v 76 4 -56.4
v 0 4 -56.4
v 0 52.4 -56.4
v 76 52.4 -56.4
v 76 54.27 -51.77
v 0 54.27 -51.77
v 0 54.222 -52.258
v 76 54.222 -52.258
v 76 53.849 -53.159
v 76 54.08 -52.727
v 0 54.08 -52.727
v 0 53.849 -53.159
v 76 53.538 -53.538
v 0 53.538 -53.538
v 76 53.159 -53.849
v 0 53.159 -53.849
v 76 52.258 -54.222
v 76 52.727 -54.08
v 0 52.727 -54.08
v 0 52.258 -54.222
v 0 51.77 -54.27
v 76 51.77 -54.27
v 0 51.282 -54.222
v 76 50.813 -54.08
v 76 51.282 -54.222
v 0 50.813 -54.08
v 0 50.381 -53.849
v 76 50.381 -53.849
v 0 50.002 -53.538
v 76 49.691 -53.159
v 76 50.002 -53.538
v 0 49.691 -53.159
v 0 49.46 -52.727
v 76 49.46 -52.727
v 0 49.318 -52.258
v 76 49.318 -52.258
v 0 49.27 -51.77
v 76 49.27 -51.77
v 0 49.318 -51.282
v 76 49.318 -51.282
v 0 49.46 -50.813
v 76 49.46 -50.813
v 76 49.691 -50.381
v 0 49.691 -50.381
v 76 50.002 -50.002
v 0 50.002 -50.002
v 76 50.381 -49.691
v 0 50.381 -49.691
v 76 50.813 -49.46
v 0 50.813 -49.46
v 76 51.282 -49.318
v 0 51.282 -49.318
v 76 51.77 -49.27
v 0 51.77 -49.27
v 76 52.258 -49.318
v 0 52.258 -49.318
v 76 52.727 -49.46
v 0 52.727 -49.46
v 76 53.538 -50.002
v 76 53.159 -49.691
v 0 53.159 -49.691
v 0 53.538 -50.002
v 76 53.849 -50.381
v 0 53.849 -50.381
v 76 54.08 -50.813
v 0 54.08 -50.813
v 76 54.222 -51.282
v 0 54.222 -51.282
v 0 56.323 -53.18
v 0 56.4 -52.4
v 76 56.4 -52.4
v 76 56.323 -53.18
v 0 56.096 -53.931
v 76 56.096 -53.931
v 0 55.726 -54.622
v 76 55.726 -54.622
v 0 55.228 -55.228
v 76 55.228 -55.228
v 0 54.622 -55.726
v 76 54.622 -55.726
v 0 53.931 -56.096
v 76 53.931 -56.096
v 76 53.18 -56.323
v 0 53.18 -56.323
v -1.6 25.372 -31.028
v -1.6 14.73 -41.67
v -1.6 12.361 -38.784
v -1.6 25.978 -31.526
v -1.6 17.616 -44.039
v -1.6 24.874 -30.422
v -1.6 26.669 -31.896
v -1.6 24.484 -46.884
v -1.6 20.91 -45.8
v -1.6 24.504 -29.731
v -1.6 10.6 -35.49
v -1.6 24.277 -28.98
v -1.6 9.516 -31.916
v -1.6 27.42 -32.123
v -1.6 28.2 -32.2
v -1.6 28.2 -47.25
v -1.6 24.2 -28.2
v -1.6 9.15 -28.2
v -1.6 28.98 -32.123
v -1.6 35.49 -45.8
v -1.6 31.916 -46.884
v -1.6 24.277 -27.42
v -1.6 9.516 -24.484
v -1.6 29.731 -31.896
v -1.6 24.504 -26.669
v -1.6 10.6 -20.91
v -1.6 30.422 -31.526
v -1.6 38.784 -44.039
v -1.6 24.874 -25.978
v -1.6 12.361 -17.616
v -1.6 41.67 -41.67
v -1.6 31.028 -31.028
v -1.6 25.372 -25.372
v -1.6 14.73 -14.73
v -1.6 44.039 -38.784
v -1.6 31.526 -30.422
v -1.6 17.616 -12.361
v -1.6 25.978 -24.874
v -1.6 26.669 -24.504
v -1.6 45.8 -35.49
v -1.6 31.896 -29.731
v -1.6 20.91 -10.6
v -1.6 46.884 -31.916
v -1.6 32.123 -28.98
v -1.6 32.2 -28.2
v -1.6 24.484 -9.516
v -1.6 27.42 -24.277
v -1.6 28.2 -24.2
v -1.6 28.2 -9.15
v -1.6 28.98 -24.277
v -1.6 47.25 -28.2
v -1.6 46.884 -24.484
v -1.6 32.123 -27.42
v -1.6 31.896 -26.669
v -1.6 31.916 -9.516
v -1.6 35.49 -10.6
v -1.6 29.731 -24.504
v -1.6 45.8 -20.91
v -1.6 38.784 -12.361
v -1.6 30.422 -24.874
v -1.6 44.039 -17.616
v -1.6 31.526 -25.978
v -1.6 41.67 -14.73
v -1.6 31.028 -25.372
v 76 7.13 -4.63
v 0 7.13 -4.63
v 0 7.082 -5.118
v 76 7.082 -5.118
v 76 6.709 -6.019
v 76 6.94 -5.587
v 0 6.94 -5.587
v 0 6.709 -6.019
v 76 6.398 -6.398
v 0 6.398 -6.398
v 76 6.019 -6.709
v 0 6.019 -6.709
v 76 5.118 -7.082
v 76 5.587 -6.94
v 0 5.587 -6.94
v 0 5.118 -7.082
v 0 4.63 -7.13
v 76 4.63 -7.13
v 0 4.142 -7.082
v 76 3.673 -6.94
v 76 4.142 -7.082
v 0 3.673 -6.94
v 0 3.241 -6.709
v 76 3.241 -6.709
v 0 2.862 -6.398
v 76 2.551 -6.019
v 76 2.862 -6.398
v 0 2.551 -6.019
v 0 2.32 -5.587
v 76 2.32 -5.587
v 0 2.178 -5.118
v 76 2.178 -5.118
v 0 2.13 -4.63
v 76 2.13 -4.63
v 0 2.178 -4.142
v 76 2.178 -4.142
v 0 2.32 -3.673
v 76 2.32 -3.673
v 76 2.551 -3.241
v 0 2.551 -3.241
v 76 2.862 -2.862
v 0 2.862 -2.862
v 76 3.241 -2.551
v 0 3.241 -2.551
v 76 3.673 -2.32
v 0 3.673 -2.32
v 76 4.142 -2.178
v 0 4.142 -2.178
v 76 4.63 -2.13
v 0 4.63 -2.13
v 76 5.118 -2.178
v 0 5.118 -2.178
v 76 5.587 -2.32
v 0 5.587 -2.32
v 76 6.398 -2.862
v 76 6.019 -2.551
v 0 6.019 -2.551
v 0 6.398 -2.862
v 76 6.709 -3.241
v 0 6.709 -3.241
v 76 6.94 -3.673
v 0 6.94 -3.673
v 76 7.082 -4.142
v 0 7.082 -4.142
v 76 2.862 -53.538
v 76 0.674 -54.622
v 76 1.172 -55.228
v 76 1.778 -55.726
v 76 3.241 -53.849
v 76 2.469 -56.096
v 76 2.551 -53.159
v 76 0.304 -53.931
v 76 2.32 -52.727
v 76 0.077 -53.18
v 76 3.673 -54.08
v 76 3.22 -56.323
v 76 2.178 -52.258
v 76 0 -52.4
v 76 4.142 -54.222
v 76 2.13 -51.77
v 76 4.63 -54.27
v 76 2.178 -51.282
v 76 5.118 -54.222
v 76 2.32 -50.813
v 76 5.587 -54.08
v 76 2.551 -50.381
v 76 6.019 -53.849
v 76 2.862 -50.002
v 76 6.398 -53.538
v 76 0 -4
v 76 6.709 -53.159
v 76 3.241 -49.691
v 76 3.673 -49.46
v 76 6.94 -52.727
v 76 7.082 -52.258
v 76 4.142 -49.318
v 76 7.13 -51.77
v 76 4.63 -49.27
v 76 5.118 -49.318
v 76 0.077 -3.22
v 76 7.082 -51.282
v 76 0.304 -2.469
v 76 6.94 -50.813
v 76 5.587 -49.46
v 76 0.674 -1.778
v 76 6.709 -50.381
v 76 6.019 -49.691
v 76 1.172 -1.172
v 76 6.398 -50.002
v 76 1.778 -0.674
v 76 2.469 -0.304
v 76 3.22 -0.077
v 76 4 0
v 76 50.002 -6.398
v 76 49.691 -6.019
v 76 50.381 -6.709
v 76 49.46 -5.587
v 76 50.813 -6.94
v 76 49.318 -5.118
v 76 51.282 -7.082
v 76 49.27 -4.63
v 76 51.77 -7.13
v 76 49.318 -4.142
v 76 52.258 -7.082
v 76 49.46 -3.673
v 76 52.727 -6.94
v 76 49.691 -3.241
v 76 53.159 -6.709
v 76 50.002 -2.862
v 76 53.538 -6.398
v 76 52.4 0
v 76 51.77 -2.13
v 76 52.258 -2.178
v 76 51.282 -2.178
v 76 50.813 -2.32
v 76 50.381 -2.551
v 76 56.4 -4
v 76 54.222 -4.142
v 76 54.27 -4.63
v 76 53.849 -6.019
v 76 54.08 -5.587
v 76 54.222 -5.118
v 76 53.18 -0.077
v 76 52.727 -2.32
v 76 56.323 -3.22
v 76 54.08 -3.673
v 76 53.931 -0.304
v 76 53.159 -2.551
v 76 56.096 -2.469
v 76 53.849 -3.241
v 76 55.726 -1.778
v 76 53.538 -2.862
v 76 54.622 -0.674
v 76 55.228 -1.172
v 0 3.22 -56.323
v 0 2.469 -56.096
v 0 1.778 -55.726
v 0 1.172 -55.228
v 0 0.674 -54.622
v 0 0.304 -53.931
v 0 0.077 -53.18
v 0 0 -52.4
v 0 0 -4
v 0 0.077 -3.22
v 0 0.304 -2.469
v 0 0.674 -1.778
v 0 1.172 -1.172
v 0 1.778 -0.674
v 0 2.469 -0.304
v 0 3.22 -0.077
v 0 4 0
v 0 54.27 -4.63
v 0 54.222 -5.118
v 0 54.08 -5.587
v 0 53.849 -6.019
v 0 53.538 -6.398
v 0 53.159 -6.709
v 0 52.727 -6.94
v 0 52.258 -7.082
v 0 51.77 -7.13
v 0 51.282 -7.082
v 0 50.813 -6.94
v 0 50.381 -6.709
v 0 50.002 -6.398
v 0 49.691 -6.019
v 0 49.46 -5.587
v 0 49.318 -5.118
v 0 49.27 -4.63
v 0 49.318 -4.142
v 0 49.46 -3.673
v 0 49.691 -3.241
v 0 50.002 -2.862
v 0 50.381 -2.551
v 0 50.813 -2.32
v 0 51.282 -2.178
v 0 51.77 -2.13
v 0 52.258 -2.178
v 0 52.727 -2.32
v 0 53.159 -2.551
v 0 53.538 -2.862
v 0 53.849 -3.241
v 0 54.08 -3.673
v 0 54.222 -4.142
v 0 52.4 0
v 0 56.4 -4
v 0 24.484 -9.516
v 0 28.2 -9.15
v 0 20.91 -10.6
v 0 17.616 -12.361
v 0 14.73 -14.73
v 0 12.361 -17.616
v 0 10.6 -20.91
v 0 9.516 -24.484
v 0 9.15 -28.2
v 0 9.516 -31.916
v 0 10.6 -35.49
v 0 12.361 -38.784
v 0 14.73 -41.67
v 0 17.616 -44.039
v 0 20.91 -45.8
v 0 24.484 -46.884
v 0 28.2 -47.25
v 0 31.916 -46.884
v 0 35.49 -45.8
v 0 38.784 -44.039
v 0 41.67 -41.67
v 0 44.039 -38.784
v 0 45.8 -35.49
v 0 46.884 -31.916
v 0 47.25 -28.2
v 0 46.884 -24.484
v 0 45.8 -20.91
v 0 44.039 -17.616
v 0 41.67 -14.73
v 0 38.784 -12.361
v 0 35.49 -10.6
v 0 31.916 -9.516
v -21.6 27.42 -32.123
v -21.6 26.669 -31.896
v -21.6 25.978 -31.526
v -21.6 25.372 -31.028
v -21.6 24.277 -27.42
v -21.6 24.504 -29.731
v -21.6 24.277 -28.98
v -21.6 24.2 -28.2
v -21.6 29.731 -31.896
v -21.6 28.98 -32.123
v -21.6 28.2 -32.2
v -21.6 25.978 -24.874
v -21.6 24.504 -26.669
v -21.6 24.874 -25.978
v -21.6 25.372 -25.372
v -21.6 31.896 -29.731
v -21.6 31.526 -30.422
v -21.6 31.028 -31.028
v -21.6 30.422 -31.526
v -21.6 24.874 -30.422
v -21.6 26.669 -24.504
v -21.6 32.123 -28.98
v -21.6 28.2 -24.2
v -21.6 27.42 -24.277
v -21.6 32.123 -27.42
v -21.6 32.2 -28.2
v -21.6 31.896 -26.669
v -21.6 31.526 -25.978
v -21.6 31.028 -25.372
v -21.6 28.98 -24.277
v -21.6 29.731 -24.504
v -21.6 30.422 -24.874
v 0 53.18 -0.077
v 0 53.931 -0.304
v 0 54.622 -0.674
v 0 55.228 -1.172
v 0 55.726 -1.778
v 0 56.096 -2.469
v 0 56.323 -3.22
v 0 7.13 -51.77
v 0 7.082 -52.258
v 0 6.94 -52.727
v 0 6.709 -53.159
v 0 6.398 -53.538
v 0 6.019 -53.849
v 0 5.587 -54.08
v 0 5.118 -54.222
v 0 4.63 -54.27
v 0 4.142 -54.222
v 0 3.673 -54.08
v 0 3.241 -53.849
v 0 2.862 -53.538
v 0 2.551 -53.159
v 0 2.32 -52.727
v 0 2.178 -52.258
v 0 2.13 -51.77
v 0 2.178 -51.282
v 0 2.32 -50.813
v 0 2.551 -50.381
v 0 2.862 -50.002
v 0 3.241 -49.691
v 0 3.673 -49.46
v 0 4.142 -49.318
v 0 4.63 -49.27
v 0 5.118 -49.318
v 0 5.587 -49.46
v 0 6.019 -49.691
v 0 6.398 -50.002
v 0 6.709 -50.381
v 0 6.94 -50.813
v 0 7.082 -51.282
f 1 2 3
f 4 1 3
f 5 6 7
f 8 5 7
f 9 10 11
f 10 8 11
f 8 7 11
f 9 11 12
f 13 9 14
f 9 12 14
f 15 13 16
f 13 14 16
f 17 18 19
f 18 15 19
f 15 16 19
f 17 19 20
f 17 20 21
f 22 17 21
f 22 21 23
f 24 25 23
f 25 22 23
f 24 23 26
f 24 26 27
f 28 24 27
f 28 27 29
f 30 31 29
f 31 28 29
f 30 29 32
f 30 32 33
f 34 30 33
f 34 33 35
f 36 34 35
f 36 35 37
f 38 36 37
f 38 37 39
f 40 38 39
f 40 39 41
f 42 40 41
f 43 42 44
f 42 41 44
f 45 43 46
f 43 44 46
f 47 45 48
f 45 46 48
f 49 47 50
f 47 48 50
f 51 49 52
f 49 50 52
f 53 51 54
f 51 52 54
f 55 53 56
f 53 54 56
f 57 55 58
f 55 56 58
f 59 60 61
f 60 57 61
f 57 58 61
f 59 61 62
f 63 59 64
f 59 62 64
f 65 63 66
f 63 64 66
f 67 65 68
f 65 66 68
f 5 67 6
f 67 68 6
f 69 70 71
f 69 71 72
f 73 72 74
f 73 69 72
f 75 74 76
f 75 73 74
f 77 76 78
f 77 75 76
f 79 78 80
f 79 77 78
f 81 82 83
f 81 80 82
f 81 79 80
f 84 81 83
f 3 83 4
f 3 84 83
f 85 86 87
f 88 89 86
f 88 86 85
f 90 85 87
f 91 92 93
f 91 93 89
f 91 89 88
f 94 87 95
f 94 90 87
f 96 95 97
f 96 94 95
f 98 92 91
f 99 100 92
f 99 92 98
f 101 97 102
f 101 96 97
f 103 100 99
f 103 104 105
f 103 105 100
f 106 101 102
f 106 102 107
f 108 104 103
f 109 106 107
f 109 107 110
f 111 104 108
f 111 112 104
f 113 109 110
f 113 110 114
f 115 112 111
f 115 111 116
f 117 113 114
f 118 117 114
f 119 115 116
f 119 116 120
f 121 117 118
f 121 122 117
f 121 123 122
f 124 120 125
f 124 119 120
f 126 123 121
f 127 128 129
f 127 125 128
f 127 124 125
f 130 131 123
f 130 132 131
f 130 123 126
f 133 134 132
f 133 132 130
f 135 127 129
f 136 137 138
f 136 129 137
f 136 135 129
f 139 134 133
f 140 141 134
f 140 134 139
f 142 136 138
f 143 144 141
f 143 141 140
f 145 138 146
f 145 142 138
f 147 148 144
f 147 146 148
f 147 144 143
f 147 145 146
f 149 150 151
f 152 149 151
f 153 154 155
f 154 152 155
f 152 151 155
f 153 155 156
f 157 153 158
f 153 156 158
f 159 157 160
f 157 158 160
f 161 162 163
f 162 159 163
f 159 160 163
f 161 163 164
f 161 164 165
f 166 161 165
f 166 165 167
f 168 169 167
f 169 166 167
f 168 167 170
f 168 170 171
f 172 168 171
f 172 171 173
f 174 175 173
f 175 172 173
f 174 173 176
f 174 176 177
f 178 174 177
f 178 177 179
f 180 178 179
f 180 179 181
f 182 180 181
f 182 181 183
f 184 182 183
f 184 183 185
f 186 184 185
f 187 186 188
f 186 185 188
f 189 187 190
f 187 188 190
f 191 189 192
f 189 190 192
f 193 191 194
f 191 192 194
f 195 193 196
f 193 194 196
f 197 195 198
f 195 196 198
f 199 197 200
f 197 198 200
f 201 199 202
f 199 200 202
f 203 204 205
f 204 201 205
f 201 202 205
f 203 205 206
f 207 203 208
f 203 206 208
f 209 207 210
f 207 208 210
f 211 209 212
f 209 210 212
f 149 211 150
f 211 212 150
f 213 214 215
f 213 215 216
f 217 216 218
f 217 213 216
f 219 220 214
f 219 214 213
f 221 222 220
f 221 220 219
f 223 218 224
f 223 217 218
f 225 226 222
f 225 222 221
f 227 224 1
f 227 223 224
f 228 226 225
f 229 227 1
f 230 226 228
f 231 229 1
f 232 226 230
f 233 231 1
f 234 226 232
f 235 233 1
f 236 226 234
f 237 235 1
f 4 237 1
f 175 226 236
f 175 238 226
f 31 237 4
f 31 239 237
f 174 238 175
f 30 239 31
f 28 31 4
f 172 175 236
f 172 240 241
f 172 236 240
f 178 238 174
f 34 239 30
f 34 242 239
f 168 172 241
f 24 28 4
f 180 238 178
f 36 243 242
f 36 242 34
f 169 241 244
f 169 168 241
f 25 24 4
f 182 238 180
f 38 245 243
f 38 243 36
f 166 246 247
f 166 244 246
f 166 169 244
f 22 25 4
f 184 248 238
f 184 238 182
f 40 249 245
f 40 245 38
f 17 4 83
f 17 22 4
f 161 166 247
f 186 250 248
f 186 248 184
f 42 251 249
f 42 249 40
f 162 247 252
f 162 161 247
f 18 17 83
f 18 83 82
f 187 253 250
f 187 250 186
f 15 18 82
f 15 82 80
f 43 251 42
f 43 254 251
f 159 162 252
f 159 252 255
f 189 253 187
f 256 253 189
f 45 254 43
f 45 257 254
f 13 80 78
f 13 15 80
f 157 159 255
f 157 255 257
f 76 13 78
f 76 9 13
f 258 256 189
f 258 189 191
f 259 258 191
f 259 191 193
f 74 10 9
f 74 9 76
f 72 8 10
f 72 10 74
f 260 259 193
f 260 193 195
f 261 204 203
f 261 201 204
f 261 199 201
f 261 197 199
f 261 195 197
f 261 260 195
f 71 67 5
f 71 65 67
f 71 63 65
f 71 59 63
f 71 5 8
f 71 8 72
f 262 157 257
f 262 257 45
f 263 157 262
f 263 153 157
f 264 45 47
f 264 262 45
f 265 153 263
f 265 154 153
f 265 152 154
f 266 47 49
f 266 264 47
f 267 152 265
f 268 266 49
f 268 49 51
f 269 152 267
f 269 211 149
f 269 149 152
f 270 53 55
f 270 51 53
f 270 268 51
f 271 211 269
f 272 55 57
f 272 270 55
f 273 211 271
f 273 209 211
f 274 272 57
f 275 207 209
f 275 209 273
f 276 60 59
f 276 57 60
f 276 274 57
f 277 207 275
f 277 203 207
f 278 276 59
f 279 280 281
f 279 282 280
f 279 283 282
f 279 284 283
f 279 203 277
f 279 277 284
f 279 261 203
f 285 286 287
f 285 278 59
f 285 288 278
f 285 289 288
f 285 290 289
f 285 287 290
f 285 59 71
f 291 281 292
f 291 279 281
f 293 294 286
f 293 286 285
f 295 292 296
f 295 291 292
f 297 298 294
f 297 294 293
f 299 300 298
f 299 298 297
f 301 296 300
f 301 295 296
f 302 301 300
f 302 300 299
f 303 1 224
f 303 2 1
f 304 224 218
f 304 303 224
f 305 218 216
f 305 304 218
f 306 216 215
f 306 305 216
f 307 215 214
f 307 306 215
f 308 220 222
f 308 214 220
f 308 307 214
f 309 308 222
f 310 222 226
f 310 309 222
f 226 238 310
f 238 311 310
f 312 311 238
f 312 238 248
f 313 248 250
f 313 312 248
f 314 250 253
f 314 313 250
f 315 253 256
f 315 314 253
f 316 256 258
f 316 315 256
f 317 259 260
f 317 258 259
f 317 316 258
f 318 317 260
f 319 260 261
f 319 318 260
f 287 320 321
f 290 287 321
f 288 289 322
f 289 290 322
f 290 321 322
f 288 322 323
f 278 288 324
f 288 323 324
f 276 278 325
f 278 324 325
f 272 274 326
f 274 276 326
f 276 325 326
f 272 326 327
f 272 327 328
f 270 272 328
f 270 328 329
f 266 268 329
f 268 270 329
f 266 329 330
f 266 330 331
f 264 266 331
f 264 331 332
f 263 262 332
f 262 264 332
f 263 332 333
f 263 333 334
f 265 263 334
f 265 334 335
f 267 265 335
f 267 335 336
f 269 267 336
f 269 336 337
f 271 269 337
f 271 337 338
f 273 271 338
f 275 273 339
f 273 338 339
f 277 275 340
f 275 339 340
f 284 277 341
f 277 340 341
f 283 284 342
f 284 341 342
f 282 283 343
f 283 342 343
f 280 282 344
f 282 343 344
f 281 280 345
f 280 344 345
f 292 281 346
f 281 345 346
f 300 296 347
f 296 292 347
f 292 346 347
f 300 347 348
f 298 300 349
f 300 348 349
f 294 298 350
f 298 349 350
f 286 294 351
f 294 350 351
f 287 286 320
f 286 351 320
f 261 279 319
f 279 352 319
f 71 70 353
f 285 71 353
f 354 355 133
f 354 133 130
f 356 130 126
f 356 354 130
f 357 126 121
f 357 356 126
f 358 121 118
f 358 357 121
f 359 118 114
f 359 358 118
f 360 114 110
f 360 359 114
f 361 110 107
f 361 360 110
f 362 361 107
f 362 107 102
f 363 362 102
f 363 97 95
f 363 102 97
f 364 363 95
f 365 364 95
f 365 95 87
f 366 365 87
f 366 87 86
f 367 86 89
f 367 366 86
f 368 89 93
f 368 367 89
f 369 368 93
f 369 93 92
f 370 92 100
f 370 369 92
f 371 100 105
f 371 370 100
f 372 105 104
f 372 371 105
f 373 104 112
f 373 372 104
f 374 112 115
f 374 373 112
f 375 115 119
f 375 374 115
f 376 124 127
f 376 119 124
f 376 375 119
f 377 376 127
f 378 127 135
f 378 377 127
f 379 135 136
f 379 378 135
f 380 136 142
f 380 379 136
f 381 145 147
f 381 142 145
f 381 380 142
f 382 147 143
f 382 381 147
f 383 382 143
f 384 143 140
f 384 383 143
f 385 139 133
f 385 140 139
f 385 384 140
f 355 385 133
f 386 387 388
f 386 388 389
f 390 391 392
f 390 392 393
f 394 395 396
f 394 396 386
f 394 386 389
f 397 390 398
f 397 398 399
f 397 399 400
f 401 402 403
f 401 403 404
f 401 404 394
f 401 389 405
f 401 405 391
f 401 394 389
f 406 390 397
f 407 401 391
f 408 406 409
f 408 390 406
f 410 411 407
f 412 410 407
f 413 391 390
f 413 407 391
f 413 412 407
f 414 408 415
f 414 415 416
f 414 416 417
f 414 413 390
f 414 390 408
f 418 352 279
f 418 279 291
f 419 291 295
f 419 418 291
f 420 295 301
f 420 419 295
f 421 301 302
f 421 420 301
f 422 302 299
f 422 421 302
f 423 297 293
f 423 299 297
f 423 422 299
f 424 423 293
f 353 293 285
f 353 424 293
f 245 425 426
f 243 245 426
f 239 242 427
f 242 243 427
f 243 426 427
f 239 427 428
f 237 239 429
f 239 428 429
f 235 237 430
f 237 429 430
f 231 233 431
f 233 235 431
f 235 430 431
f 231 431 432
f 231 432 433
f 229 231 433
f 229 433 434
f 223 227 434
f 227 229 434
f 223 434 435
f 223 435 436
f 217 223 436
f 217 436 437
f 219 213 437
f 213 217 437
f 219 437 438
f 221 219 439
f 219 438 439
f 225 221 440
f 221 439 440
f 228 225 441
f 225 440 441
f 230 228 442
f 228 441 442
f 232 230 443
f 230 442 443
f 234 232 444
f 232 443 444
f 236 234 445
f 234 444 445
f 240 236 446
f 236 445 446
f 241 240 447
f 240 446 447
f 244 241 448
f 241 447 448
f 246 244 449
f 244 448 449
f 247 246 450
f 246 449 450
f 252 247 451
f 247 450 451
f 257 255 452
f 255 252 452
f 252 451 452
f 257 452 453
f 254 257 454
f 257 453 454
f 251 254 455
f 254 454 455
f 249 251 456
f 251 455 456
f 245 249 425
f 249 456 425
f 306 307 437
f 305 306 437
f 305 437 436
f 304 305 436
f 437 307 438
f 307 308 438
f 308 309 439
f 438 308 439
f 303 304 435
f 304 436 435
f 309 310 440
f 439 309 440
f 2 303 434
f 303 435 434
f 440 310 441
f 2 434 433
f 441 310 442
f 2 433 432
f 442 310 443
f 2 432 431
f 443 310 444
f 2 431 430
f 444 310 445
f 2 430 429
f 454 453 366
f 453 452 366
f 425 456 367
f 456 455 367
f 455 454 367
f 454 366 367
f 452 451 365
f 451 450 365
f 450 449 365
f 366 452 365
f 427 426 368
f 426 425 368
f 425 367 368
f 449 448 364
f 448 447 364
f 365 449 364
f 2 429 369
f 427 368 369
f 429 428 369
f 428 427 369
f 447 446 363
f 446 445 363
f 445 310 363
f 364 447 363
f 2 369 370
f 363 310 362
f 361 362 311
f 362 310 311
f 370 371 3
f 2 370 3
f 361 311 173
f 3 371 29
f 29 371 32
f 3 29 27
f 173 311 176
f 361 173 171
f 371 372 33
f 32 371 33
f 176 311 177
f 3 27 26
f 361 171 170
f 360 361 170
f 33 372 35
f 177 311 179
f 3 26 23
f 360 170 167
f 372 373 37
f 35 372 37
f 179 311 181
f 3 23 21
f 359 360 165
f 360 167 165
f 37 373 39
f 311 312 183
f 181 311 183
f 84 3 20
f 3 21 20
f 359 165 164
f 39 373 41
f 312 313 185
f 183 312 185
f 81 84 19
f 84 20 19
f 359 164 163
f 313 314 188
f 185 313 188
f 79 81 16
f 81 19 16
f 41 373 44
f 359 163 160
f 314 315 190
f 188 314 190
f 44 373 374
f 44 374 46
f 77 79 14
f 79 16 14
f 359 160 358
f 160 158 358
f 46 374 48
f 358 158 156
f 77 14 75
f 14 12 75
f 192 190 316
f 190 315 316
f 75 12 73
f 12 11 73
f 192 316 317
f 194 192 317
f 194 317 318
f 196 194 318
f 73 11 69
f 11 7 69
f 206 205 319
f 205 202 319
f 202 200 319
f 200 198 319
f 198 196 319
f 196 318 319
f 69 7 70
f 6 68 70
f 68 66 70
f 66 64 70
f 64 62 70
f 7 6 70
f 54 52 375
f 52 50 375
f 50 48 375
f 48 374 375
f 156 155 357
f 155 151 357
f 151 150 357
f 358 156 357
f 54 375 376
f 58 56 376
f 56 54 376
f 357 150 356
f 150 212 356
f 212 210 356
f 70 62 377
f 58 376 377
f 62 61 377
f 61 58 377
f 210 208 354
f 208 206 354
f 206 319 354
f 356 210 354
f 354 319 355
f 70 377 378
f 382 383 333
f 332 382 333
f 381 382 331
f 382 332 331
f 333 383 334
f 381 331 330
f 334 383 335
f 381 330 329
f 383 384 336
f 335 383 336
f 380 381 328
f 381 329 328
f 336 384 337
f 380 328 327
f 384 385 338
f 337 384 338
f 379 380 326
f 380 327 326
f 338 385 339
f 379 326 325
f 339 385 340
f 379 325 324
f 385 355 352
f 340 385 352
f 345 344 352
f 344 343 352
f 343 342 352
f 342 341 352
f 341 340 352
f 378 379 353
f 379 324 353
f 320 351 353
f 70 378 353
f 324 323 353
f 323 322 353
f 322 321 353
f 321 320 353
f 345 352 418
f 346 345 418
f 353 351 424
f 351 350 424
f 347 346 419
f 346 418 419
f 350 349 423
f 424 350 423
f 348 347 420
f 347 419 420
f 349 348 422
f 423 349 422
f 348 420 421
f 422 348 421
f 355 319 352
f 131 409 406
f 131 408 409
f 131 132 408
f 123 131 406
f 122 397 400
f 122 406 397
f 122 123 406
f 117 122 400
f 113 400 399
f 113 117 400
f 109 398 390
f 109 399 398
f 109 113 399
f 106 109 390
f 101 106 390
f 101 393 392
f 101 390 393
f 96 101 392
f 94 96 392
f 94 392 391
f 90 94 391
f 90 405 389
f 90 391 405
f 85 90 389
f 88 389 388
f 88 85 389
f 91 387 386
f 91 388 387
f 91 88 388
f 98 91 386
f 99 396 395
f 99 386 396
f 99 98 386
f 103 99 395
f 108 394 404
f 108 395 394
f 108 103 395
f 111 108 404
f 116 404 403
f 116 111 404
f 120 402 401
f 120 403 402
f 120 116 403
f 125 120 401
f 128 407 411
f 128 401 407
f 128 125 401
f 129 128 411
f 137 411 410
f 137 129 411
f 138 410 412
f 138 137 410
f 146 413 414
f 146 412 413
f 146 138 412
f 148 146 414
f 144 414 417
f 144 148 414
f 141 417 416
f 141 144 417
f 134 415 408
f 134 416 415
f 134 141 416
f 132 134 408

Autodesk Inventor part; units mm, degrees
ref_plane "YZ Plane" through (0, 0, 0) normal (1, 0, 0) x (0, 1, 0)
ref_plane "XZ Plane" through (0, 0, 0) normal (0, 1, 0) x (-1, 0, 0)
ref_plane "XY Plane" through (0, 0, 0) normal (0, 0, 1) x (1, 0, 0)
sketch "Sketch1" plane through (0, 0, 0) normal (1, 0, 0) x (0, 1, 0)
  line L0 (52.4, 0) -> (4, 0)
  line L1 (0, -4) -> (0, -52.4)
  line L2 (4, -56.4) -> (52.4, -56.4)
  line L3 (56.4, -52.4) -> (56.4, -4)
  line L4 (51.77, -4.63) -> (4.63, -4.63) construction
  line L5 (4.63, -4.63) -> (4.63, -51.77) construction
  line L6 (4.63, -51.77) -> (51.77, -51.77) construction
  line L7 (51.77, -51.77) -> (51.77, -4.63) construction
  circle A0 centre (51.77, -4.63) radius 2.5
  circle A1 centre (51.77, -51.77) radius 2.5
  circle A2 centre (4.63, -4.63) radius 2.5
  circle A3 centre (4.63, -51.77) radius 2.5
  arc A4 (56.4, -4) -> (52.4, 0) centre (52.4, -4) ccw
  arc A5 (52.4, -56.4) -> (56.4, -52.4) centre (52.4, -52.4) ccw
  arc A6 (0, -52.4) -> (4, -56.4) centre (4, -52.4) ccw
  arc A7 (4, 0) -> (0, -4) centre (4, -4) ccw
  point P0 (0, 0)
  point P1 (56.4, 0)
  point P2 (0, 0)
  point P3 (56.4, -56.4)
  point P4 (56.4, -28.2)
  point P5 (51.77, -28.2)
  point P6 (28.2, -51.77)
  point P7 (28.2, -56.4)
  dimension "d0" = 56.4
  dimension "d1" = 47.14
  dimension "d2" = 5
  dimension "d3" = 4
  dimension "d4" = 4
  dimension "d5" = 4
  dimension "d6" = 4
extrude "Extrusion1" add sketch "Sketch1" along normal blind 76
sketch "Sketch2" plane through (0, 0, 0) normal (-1, 0, 0) x (0, 0, 1)
  circle A0 centre (-28.2, 28.2) radius 19.05
  line L0 (-52.4, 56.4) -> (-4, 56.4) projected
  line L1 (-56.4, 4) -> (-56.4, 52.4) projected
  point P0 (0, 0)
  point P1 (-28.2, 56.4)
  point P2 (-56.4, 28.2)
  dimension "d9" = 38.1
extrude "Extrusion2" add sketch "Sketch2" along normal blind 1.6
sketch "Sketch3" plane through (-1.6, 28.2, -28.2) normal (-1, 0, 0) x (0, 0, 1)
  circle A0 centre (0, 0) radius 4
  circle A1 centre (0, 0) radius 19.05 construction
  point P0 (28.2, -28.2)
  dimension "d12" = 8
extrude "Extrusion3" add sketch "Sketch3" along normal blind 20
properties part number "Nema23"
